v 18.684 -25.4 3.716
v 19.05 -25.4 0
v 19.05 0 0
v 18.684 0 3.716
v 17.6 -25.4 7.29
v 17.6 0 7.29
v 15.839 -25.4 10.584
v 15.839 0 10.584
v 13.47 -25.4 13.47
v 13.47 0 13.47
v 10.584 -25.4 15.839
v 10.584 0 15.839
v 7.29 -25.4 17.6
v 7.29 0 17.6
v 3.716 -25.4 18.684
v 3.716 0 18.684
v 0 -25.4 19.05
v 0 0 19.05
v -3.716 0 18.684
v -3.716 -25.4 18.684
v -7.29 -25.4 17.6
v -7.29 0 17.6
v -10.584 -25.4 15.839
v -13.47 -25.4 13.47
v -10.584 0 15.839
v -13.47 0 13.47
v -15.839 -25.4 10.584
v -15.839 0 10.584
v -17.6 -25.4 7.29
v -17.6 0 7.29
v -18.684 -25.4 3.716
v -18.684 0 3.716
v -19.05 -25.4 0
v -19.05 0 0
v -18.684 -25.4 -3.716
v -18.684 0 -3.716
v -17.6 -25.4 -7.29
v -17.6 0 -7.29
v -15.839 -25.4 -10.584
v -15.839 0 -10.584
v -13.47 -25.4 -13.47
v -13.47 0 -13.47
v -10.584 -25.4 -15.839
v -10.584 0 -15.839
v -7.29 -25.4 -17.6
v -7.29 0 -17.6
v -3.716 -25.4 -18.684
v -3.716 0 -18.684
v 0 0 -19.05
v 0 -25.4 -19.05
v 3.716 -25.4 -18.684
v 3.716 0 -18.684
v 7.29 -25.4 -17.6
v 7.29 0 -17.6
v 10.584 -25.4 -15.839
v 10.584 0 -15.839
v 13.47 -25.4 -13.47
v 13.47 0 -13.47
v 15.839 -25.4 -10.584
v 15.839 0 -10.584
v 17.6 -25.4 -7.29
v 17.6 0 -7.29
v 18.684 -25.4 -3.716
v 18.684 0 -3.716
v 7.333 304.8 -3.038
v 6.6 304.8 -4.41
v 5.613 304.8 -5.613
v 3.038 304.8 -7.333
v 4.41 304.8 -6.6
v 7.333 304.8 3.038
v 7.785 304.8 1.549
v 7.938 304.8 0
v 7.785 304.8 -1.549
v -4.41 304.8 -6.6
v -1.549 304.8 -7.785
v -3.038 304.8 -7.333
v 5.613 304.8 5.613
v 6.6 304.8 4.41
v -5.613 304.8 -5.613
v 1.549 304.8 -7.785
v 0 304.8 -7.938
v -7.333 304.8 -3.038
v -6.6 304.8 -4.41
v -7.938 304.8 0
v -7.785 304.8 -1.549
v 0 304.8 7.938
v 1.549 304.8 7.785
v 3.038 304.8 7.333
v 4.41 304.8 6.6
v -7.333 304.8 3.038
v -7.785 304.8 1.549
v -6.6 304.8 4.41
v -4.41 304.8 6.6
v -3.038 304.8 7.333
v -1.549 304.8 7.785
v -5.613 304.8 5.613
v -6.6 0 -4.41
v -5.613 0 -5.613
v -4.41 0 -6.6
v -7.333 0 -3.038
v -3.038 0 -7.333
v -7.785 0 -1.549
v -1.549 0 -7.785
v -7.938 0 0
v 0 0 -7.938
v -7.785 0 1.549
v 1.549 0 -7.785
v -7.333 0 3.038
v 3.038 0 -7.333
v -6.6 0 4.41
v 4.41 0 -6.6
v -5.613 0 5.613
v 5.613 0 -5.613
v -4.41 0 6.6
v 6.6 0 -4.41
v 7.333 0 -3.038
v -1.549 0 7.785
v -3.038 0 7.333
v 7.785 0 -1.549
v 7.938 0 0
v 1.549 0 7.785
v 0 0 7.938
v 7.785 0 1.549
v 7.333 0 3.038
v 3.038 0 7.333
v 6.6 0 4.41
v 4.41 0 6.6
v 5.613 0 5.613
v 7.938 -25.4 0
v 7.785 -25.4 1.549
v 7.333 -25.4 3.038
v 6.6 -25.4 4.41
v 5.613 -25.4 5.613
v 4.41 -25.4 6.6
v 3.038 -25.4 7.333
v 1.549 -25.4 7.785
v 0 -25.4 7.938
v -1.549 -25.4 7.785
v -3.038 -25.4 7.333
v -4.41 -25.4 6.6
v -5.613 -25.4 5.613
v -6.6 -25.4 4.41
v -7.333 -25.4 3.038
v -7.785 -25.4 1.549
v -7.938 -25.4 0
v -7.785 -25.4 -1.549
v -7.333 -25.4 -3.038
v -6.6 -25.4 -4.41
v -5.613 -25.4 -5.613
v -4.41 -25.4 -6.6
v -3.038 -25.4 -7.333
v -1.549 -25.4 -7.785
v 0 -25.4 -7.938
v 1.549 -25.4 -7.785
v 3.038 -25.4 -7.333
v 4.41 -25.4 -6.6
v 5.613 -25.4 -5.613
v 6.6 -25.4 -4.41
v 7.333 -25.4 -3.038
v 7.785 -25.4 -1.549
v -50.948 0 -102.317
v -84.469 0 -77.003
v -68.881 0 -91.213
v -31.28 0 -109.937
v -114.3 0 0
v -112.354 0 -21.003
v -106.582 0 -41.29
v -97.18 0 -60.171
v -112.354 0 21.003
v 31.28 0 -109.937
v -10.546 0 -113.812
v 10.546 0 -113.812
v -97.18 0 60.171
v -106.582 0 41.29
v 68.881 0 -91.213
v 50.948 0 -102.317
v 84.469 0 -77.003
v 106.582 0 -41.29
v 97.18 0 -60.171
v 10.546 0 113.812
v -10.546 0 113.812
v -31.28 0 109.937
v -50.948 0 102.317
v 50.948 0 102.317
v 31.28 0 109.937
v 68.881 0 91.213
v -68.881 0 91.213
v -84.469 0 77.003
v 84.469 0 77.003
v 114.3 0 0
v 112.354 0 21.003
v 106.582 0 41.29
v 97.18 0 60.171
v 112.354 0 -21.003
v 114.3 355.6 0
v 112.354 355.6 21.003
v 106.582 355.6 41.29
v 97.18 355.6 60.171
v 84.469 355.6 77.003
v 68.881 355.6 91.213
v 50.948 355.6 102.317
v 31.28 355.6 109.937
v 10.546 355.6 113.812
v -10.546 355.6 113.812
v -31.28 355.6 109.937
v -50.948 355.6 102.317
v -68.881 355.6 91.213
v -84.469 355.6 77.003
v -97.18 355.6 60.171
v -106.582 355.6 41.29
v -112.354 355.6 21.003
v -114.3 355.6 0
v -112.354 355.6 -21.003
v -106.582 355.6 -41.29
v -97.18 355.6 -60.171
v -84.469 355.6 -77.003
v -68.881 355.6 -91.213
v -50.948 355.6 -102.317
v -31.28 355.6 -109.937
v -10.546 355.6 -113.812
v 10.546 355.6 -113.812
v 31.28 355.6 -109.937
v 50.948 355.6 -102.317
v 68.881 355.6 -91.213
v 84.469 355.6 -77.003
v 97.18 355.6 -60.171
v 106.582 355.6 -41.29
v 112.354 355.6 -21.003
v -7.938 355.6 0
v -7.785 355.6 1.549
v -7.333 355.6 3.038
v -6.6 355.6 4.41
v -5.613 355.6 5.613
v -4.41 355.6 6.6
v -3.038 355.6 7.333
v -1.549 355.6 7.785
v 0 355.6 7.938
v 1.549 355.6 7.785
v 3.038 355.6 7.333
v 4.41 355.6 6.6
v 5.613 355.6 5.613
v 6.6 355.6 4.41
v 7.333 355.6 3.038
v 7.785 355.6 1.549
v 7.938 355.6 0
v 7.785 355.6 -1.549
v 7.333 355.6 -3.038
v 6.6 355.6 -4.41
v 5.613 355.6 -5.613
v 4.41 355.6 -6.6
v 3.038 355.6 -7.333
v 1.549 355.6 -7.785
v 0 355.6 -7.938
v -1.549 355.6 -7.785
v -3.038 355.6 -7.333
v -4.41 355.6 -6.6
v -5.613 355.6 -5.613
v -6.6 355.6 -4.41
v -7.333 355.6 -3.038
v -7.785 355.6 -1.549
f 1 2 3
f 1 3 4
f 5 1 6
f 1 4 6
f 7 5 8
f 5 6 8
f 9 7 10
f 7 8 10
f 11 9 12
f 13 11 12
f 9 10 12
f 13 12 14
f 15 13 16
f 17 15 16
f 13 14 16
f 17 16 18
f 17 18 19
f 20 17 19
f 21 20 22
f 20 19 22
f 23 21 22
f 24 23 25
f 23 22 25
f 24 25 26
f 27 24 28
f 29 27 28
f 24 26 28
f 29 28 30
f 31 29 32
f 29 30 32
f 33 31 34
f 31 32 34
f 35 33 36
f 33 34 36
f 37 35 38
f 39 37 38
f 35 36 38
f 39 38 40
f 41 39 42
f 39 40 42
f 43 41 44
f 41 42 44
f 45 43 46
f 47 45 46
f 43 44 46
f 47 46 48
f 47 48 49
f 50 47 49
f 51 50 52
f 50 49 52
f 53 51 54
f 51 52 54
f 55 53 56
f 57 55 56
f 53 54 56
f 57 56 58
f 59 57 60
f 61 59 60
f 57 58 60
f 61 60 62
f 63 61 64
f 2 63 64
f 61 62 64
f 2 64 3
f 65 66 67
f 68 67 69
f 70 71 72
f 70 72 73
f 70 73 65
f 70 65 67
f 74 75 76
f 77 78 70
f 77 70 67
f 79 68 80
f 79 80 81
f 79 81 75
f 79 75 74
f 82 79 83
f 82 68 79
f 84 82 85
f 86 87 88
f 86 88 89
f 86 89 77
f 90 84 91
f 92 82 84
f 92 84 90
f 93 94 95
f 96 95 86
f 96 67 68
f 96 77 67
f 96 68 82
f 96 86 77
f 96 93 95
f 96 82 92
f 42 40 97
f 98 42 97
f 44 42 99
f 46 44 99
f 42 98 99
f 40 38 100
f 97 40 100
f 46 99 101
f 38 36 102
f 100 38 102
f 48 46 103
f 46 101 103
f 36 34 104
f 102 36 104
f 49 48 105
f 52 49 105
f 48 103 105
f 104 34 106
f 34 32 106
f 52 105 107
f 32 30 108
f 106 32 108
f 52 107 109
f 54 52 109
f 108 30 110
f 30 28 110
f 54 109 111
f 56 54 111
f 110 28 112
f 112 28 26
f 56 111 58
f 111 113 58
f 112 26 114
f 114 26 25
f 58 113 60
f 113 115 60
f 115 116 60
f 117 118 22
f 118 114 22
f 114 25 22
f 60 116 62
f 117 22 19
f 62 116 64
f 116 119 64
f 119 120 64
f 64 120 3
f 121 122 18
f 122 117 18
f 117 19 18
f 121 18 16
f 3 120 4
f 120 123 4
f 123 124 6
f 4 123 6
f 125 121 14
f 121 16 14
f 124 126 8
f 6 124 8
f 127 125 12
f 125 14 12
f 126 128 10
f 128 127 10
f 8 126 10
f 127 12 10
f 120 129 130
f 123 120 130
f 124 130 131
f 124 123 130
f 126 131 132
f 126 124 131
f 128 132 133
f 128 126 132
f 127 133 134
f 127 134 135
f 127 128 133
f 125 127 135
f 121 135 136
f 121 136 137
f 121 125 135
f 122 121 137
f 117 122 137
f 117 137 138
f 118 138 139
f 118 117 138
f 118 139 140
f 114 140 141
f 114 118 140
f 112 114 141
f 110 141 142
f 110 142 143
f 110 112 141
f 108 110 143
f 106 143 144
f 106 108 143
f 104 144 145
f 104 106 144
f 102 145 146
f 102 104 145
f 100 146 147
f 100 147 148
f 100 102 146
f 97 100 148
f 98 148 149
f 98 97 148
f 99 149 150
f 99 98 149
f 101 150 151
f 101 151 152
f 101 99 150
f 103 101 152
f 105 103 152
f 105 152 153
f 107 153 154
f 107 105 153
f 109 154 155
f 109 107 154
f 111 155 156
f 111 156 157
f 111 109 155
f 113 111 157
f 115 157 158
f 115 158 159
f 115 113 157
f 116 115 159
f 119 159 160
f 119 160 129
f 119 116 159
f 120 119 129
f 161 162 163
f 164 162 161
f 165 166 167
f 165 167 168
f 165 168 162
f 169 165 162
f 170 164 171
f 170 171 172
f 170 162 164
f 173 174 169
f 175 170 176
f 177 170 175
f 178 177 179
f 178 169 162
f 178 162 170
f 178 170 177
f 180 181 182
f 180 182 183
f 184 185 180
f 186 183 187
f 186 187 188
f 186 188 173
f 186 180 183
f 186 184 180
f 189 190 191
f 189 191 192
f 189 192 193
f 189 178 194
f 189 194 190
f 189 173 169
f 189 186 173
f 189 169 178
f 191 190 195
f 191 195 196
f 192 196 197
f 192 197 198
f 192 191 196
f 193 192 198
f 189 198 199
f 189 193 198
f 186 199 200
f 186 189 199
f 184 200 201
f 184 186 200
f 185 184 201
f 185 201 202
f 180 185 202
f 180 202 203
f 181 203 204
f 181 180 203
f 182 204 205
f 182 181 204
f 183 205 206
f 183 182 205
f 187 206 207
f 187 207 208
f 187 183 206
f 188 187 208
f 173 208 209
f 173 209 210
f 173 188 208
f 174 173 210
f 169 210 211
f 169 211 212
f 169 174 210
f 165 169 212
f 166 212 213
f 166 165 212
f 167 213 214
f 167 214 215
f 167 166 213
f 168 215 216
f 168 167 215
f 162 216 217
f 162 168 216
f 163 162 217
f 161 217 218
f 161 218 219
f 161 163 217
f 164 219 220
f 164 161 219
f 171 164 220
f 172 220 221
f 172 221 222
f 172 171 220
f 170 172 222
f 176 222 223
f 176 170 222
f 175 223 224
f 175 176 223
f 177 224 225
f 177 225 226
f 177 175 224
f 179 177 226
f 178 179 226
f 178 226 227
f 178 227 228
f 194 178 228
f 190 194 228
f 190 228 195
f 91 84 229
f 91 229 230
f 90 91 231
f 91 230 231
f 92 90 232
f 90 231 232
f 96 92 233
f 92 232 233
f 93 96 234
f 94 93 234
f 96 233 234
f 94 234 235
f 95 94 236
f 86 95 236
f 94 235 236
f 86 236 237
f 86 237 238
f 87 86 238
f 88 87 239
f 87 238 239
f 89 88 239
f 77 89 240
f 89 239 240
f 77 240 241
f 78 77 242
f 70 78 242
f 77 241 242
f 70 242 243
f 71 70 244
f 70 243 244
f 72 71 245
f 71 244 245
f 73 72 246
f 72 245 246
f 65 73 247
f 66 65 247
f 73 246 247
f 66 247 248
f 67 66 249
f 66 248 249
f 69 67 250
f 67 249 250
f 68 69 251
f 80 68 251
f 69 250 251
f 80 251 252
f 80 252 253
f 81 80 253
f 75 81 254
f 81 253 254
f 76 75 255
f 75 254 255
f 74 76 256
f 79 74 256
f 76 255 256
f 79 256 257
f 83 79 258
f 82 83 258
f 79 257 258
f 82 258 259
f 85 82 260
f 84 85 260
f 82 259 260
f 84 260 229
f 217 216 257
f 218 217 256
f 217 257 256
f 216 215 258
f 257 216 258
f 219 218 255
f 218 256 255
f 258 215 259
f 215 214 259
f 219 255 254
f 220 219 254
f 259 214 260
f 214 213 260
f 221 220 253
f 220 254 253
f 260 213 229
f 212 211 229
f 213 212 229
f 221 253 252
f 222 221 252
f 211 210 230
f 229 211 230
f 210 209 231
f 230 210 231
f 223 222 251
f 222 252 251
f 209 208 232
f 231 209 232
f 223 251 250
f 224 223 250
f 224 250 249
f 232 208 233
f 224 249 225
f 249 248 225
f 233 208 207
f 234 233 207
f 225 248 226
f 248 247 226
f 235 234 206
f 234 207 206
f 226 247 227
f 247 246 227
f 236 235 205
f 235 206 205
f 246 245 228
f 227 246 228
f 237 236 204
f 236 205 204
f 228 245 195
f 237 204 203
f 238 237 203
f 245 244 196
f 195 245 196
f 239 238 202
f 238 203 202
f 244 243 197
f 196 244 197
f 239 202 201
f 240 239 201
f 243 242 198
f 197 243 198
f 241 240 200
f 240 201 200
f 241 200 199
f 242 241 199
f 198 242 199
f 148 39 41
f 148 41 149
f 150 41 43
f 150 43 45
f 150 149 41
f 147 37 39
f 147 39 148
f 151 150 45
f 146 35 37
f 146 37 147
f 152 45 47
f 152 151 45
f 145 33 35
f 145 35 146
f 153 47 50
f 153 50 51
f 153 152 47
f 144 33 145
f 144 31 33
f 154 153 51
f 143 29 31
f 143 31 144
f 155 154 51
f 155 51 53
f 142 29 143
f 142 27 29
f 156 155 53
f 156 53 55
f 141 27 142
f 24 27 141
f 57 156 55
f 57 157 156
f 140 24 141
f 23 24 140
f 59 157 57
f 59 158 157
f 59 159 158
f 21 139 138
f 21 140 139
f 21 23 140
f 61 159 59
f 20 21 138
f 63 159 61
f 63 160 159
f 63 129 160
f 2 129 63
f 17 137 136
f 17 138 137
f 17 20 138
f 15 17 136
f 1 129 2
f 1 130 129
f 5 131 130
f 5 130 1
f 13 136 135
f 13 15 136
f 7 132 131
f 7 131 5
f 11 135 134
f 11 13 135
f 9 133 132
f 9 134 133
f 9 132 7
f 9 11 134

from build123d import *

# Parameters (mm, degrees)
F0_R     = 19.05
F0_R_2   = 7.9375
F1_DEPTH = 25.4
F2_R     = 114.3
F3_DEPTH = 355.6
F4_R     = 7.9375
F5_DEPTH = 50.8
F6_R     = 114.3
F7_DEPTH = 50.8


with BuildPart() as f1:
    # F0 (on Front) → F1 (new body)
    with BuildSketch(Plane.XZ):
        Circle(F0_R)
        Circle(F0_R_2, mode=Mode.SUBTRACT)
    extrude(amount=F1_DEPTH)


with BuildPart() as f3:
    # F2 (on Front) → F3 (new body)
    with BuildSketch(Plane.XZ):
        Circle(F2_R)
    extrude(amount=-F3_DEPTH)

    # F4 (on face) → F5 (cut)
    with BuildSketch(Plane(origin=(0, 355.6, 0), x_dir=(-1, 0, 0), z_dir=(0, 1, 0))):
        Circle(F4_R)
    extrude(amount=-F5_DEPTH, mode=Mode.SUBTRACT)


with BuildPart() as f7:
    # F6 (on face) → F7 (new body)
    with BuildSketch(Plane(origin=(0, 355.6, 0), x_dir=(-1, 0, 0), z_dir=(0, 1, 0))):
        Circle(F6_R)
    extrude(amount=F7_DEPTH)


solid = Compound([f1.part, f3.part])
